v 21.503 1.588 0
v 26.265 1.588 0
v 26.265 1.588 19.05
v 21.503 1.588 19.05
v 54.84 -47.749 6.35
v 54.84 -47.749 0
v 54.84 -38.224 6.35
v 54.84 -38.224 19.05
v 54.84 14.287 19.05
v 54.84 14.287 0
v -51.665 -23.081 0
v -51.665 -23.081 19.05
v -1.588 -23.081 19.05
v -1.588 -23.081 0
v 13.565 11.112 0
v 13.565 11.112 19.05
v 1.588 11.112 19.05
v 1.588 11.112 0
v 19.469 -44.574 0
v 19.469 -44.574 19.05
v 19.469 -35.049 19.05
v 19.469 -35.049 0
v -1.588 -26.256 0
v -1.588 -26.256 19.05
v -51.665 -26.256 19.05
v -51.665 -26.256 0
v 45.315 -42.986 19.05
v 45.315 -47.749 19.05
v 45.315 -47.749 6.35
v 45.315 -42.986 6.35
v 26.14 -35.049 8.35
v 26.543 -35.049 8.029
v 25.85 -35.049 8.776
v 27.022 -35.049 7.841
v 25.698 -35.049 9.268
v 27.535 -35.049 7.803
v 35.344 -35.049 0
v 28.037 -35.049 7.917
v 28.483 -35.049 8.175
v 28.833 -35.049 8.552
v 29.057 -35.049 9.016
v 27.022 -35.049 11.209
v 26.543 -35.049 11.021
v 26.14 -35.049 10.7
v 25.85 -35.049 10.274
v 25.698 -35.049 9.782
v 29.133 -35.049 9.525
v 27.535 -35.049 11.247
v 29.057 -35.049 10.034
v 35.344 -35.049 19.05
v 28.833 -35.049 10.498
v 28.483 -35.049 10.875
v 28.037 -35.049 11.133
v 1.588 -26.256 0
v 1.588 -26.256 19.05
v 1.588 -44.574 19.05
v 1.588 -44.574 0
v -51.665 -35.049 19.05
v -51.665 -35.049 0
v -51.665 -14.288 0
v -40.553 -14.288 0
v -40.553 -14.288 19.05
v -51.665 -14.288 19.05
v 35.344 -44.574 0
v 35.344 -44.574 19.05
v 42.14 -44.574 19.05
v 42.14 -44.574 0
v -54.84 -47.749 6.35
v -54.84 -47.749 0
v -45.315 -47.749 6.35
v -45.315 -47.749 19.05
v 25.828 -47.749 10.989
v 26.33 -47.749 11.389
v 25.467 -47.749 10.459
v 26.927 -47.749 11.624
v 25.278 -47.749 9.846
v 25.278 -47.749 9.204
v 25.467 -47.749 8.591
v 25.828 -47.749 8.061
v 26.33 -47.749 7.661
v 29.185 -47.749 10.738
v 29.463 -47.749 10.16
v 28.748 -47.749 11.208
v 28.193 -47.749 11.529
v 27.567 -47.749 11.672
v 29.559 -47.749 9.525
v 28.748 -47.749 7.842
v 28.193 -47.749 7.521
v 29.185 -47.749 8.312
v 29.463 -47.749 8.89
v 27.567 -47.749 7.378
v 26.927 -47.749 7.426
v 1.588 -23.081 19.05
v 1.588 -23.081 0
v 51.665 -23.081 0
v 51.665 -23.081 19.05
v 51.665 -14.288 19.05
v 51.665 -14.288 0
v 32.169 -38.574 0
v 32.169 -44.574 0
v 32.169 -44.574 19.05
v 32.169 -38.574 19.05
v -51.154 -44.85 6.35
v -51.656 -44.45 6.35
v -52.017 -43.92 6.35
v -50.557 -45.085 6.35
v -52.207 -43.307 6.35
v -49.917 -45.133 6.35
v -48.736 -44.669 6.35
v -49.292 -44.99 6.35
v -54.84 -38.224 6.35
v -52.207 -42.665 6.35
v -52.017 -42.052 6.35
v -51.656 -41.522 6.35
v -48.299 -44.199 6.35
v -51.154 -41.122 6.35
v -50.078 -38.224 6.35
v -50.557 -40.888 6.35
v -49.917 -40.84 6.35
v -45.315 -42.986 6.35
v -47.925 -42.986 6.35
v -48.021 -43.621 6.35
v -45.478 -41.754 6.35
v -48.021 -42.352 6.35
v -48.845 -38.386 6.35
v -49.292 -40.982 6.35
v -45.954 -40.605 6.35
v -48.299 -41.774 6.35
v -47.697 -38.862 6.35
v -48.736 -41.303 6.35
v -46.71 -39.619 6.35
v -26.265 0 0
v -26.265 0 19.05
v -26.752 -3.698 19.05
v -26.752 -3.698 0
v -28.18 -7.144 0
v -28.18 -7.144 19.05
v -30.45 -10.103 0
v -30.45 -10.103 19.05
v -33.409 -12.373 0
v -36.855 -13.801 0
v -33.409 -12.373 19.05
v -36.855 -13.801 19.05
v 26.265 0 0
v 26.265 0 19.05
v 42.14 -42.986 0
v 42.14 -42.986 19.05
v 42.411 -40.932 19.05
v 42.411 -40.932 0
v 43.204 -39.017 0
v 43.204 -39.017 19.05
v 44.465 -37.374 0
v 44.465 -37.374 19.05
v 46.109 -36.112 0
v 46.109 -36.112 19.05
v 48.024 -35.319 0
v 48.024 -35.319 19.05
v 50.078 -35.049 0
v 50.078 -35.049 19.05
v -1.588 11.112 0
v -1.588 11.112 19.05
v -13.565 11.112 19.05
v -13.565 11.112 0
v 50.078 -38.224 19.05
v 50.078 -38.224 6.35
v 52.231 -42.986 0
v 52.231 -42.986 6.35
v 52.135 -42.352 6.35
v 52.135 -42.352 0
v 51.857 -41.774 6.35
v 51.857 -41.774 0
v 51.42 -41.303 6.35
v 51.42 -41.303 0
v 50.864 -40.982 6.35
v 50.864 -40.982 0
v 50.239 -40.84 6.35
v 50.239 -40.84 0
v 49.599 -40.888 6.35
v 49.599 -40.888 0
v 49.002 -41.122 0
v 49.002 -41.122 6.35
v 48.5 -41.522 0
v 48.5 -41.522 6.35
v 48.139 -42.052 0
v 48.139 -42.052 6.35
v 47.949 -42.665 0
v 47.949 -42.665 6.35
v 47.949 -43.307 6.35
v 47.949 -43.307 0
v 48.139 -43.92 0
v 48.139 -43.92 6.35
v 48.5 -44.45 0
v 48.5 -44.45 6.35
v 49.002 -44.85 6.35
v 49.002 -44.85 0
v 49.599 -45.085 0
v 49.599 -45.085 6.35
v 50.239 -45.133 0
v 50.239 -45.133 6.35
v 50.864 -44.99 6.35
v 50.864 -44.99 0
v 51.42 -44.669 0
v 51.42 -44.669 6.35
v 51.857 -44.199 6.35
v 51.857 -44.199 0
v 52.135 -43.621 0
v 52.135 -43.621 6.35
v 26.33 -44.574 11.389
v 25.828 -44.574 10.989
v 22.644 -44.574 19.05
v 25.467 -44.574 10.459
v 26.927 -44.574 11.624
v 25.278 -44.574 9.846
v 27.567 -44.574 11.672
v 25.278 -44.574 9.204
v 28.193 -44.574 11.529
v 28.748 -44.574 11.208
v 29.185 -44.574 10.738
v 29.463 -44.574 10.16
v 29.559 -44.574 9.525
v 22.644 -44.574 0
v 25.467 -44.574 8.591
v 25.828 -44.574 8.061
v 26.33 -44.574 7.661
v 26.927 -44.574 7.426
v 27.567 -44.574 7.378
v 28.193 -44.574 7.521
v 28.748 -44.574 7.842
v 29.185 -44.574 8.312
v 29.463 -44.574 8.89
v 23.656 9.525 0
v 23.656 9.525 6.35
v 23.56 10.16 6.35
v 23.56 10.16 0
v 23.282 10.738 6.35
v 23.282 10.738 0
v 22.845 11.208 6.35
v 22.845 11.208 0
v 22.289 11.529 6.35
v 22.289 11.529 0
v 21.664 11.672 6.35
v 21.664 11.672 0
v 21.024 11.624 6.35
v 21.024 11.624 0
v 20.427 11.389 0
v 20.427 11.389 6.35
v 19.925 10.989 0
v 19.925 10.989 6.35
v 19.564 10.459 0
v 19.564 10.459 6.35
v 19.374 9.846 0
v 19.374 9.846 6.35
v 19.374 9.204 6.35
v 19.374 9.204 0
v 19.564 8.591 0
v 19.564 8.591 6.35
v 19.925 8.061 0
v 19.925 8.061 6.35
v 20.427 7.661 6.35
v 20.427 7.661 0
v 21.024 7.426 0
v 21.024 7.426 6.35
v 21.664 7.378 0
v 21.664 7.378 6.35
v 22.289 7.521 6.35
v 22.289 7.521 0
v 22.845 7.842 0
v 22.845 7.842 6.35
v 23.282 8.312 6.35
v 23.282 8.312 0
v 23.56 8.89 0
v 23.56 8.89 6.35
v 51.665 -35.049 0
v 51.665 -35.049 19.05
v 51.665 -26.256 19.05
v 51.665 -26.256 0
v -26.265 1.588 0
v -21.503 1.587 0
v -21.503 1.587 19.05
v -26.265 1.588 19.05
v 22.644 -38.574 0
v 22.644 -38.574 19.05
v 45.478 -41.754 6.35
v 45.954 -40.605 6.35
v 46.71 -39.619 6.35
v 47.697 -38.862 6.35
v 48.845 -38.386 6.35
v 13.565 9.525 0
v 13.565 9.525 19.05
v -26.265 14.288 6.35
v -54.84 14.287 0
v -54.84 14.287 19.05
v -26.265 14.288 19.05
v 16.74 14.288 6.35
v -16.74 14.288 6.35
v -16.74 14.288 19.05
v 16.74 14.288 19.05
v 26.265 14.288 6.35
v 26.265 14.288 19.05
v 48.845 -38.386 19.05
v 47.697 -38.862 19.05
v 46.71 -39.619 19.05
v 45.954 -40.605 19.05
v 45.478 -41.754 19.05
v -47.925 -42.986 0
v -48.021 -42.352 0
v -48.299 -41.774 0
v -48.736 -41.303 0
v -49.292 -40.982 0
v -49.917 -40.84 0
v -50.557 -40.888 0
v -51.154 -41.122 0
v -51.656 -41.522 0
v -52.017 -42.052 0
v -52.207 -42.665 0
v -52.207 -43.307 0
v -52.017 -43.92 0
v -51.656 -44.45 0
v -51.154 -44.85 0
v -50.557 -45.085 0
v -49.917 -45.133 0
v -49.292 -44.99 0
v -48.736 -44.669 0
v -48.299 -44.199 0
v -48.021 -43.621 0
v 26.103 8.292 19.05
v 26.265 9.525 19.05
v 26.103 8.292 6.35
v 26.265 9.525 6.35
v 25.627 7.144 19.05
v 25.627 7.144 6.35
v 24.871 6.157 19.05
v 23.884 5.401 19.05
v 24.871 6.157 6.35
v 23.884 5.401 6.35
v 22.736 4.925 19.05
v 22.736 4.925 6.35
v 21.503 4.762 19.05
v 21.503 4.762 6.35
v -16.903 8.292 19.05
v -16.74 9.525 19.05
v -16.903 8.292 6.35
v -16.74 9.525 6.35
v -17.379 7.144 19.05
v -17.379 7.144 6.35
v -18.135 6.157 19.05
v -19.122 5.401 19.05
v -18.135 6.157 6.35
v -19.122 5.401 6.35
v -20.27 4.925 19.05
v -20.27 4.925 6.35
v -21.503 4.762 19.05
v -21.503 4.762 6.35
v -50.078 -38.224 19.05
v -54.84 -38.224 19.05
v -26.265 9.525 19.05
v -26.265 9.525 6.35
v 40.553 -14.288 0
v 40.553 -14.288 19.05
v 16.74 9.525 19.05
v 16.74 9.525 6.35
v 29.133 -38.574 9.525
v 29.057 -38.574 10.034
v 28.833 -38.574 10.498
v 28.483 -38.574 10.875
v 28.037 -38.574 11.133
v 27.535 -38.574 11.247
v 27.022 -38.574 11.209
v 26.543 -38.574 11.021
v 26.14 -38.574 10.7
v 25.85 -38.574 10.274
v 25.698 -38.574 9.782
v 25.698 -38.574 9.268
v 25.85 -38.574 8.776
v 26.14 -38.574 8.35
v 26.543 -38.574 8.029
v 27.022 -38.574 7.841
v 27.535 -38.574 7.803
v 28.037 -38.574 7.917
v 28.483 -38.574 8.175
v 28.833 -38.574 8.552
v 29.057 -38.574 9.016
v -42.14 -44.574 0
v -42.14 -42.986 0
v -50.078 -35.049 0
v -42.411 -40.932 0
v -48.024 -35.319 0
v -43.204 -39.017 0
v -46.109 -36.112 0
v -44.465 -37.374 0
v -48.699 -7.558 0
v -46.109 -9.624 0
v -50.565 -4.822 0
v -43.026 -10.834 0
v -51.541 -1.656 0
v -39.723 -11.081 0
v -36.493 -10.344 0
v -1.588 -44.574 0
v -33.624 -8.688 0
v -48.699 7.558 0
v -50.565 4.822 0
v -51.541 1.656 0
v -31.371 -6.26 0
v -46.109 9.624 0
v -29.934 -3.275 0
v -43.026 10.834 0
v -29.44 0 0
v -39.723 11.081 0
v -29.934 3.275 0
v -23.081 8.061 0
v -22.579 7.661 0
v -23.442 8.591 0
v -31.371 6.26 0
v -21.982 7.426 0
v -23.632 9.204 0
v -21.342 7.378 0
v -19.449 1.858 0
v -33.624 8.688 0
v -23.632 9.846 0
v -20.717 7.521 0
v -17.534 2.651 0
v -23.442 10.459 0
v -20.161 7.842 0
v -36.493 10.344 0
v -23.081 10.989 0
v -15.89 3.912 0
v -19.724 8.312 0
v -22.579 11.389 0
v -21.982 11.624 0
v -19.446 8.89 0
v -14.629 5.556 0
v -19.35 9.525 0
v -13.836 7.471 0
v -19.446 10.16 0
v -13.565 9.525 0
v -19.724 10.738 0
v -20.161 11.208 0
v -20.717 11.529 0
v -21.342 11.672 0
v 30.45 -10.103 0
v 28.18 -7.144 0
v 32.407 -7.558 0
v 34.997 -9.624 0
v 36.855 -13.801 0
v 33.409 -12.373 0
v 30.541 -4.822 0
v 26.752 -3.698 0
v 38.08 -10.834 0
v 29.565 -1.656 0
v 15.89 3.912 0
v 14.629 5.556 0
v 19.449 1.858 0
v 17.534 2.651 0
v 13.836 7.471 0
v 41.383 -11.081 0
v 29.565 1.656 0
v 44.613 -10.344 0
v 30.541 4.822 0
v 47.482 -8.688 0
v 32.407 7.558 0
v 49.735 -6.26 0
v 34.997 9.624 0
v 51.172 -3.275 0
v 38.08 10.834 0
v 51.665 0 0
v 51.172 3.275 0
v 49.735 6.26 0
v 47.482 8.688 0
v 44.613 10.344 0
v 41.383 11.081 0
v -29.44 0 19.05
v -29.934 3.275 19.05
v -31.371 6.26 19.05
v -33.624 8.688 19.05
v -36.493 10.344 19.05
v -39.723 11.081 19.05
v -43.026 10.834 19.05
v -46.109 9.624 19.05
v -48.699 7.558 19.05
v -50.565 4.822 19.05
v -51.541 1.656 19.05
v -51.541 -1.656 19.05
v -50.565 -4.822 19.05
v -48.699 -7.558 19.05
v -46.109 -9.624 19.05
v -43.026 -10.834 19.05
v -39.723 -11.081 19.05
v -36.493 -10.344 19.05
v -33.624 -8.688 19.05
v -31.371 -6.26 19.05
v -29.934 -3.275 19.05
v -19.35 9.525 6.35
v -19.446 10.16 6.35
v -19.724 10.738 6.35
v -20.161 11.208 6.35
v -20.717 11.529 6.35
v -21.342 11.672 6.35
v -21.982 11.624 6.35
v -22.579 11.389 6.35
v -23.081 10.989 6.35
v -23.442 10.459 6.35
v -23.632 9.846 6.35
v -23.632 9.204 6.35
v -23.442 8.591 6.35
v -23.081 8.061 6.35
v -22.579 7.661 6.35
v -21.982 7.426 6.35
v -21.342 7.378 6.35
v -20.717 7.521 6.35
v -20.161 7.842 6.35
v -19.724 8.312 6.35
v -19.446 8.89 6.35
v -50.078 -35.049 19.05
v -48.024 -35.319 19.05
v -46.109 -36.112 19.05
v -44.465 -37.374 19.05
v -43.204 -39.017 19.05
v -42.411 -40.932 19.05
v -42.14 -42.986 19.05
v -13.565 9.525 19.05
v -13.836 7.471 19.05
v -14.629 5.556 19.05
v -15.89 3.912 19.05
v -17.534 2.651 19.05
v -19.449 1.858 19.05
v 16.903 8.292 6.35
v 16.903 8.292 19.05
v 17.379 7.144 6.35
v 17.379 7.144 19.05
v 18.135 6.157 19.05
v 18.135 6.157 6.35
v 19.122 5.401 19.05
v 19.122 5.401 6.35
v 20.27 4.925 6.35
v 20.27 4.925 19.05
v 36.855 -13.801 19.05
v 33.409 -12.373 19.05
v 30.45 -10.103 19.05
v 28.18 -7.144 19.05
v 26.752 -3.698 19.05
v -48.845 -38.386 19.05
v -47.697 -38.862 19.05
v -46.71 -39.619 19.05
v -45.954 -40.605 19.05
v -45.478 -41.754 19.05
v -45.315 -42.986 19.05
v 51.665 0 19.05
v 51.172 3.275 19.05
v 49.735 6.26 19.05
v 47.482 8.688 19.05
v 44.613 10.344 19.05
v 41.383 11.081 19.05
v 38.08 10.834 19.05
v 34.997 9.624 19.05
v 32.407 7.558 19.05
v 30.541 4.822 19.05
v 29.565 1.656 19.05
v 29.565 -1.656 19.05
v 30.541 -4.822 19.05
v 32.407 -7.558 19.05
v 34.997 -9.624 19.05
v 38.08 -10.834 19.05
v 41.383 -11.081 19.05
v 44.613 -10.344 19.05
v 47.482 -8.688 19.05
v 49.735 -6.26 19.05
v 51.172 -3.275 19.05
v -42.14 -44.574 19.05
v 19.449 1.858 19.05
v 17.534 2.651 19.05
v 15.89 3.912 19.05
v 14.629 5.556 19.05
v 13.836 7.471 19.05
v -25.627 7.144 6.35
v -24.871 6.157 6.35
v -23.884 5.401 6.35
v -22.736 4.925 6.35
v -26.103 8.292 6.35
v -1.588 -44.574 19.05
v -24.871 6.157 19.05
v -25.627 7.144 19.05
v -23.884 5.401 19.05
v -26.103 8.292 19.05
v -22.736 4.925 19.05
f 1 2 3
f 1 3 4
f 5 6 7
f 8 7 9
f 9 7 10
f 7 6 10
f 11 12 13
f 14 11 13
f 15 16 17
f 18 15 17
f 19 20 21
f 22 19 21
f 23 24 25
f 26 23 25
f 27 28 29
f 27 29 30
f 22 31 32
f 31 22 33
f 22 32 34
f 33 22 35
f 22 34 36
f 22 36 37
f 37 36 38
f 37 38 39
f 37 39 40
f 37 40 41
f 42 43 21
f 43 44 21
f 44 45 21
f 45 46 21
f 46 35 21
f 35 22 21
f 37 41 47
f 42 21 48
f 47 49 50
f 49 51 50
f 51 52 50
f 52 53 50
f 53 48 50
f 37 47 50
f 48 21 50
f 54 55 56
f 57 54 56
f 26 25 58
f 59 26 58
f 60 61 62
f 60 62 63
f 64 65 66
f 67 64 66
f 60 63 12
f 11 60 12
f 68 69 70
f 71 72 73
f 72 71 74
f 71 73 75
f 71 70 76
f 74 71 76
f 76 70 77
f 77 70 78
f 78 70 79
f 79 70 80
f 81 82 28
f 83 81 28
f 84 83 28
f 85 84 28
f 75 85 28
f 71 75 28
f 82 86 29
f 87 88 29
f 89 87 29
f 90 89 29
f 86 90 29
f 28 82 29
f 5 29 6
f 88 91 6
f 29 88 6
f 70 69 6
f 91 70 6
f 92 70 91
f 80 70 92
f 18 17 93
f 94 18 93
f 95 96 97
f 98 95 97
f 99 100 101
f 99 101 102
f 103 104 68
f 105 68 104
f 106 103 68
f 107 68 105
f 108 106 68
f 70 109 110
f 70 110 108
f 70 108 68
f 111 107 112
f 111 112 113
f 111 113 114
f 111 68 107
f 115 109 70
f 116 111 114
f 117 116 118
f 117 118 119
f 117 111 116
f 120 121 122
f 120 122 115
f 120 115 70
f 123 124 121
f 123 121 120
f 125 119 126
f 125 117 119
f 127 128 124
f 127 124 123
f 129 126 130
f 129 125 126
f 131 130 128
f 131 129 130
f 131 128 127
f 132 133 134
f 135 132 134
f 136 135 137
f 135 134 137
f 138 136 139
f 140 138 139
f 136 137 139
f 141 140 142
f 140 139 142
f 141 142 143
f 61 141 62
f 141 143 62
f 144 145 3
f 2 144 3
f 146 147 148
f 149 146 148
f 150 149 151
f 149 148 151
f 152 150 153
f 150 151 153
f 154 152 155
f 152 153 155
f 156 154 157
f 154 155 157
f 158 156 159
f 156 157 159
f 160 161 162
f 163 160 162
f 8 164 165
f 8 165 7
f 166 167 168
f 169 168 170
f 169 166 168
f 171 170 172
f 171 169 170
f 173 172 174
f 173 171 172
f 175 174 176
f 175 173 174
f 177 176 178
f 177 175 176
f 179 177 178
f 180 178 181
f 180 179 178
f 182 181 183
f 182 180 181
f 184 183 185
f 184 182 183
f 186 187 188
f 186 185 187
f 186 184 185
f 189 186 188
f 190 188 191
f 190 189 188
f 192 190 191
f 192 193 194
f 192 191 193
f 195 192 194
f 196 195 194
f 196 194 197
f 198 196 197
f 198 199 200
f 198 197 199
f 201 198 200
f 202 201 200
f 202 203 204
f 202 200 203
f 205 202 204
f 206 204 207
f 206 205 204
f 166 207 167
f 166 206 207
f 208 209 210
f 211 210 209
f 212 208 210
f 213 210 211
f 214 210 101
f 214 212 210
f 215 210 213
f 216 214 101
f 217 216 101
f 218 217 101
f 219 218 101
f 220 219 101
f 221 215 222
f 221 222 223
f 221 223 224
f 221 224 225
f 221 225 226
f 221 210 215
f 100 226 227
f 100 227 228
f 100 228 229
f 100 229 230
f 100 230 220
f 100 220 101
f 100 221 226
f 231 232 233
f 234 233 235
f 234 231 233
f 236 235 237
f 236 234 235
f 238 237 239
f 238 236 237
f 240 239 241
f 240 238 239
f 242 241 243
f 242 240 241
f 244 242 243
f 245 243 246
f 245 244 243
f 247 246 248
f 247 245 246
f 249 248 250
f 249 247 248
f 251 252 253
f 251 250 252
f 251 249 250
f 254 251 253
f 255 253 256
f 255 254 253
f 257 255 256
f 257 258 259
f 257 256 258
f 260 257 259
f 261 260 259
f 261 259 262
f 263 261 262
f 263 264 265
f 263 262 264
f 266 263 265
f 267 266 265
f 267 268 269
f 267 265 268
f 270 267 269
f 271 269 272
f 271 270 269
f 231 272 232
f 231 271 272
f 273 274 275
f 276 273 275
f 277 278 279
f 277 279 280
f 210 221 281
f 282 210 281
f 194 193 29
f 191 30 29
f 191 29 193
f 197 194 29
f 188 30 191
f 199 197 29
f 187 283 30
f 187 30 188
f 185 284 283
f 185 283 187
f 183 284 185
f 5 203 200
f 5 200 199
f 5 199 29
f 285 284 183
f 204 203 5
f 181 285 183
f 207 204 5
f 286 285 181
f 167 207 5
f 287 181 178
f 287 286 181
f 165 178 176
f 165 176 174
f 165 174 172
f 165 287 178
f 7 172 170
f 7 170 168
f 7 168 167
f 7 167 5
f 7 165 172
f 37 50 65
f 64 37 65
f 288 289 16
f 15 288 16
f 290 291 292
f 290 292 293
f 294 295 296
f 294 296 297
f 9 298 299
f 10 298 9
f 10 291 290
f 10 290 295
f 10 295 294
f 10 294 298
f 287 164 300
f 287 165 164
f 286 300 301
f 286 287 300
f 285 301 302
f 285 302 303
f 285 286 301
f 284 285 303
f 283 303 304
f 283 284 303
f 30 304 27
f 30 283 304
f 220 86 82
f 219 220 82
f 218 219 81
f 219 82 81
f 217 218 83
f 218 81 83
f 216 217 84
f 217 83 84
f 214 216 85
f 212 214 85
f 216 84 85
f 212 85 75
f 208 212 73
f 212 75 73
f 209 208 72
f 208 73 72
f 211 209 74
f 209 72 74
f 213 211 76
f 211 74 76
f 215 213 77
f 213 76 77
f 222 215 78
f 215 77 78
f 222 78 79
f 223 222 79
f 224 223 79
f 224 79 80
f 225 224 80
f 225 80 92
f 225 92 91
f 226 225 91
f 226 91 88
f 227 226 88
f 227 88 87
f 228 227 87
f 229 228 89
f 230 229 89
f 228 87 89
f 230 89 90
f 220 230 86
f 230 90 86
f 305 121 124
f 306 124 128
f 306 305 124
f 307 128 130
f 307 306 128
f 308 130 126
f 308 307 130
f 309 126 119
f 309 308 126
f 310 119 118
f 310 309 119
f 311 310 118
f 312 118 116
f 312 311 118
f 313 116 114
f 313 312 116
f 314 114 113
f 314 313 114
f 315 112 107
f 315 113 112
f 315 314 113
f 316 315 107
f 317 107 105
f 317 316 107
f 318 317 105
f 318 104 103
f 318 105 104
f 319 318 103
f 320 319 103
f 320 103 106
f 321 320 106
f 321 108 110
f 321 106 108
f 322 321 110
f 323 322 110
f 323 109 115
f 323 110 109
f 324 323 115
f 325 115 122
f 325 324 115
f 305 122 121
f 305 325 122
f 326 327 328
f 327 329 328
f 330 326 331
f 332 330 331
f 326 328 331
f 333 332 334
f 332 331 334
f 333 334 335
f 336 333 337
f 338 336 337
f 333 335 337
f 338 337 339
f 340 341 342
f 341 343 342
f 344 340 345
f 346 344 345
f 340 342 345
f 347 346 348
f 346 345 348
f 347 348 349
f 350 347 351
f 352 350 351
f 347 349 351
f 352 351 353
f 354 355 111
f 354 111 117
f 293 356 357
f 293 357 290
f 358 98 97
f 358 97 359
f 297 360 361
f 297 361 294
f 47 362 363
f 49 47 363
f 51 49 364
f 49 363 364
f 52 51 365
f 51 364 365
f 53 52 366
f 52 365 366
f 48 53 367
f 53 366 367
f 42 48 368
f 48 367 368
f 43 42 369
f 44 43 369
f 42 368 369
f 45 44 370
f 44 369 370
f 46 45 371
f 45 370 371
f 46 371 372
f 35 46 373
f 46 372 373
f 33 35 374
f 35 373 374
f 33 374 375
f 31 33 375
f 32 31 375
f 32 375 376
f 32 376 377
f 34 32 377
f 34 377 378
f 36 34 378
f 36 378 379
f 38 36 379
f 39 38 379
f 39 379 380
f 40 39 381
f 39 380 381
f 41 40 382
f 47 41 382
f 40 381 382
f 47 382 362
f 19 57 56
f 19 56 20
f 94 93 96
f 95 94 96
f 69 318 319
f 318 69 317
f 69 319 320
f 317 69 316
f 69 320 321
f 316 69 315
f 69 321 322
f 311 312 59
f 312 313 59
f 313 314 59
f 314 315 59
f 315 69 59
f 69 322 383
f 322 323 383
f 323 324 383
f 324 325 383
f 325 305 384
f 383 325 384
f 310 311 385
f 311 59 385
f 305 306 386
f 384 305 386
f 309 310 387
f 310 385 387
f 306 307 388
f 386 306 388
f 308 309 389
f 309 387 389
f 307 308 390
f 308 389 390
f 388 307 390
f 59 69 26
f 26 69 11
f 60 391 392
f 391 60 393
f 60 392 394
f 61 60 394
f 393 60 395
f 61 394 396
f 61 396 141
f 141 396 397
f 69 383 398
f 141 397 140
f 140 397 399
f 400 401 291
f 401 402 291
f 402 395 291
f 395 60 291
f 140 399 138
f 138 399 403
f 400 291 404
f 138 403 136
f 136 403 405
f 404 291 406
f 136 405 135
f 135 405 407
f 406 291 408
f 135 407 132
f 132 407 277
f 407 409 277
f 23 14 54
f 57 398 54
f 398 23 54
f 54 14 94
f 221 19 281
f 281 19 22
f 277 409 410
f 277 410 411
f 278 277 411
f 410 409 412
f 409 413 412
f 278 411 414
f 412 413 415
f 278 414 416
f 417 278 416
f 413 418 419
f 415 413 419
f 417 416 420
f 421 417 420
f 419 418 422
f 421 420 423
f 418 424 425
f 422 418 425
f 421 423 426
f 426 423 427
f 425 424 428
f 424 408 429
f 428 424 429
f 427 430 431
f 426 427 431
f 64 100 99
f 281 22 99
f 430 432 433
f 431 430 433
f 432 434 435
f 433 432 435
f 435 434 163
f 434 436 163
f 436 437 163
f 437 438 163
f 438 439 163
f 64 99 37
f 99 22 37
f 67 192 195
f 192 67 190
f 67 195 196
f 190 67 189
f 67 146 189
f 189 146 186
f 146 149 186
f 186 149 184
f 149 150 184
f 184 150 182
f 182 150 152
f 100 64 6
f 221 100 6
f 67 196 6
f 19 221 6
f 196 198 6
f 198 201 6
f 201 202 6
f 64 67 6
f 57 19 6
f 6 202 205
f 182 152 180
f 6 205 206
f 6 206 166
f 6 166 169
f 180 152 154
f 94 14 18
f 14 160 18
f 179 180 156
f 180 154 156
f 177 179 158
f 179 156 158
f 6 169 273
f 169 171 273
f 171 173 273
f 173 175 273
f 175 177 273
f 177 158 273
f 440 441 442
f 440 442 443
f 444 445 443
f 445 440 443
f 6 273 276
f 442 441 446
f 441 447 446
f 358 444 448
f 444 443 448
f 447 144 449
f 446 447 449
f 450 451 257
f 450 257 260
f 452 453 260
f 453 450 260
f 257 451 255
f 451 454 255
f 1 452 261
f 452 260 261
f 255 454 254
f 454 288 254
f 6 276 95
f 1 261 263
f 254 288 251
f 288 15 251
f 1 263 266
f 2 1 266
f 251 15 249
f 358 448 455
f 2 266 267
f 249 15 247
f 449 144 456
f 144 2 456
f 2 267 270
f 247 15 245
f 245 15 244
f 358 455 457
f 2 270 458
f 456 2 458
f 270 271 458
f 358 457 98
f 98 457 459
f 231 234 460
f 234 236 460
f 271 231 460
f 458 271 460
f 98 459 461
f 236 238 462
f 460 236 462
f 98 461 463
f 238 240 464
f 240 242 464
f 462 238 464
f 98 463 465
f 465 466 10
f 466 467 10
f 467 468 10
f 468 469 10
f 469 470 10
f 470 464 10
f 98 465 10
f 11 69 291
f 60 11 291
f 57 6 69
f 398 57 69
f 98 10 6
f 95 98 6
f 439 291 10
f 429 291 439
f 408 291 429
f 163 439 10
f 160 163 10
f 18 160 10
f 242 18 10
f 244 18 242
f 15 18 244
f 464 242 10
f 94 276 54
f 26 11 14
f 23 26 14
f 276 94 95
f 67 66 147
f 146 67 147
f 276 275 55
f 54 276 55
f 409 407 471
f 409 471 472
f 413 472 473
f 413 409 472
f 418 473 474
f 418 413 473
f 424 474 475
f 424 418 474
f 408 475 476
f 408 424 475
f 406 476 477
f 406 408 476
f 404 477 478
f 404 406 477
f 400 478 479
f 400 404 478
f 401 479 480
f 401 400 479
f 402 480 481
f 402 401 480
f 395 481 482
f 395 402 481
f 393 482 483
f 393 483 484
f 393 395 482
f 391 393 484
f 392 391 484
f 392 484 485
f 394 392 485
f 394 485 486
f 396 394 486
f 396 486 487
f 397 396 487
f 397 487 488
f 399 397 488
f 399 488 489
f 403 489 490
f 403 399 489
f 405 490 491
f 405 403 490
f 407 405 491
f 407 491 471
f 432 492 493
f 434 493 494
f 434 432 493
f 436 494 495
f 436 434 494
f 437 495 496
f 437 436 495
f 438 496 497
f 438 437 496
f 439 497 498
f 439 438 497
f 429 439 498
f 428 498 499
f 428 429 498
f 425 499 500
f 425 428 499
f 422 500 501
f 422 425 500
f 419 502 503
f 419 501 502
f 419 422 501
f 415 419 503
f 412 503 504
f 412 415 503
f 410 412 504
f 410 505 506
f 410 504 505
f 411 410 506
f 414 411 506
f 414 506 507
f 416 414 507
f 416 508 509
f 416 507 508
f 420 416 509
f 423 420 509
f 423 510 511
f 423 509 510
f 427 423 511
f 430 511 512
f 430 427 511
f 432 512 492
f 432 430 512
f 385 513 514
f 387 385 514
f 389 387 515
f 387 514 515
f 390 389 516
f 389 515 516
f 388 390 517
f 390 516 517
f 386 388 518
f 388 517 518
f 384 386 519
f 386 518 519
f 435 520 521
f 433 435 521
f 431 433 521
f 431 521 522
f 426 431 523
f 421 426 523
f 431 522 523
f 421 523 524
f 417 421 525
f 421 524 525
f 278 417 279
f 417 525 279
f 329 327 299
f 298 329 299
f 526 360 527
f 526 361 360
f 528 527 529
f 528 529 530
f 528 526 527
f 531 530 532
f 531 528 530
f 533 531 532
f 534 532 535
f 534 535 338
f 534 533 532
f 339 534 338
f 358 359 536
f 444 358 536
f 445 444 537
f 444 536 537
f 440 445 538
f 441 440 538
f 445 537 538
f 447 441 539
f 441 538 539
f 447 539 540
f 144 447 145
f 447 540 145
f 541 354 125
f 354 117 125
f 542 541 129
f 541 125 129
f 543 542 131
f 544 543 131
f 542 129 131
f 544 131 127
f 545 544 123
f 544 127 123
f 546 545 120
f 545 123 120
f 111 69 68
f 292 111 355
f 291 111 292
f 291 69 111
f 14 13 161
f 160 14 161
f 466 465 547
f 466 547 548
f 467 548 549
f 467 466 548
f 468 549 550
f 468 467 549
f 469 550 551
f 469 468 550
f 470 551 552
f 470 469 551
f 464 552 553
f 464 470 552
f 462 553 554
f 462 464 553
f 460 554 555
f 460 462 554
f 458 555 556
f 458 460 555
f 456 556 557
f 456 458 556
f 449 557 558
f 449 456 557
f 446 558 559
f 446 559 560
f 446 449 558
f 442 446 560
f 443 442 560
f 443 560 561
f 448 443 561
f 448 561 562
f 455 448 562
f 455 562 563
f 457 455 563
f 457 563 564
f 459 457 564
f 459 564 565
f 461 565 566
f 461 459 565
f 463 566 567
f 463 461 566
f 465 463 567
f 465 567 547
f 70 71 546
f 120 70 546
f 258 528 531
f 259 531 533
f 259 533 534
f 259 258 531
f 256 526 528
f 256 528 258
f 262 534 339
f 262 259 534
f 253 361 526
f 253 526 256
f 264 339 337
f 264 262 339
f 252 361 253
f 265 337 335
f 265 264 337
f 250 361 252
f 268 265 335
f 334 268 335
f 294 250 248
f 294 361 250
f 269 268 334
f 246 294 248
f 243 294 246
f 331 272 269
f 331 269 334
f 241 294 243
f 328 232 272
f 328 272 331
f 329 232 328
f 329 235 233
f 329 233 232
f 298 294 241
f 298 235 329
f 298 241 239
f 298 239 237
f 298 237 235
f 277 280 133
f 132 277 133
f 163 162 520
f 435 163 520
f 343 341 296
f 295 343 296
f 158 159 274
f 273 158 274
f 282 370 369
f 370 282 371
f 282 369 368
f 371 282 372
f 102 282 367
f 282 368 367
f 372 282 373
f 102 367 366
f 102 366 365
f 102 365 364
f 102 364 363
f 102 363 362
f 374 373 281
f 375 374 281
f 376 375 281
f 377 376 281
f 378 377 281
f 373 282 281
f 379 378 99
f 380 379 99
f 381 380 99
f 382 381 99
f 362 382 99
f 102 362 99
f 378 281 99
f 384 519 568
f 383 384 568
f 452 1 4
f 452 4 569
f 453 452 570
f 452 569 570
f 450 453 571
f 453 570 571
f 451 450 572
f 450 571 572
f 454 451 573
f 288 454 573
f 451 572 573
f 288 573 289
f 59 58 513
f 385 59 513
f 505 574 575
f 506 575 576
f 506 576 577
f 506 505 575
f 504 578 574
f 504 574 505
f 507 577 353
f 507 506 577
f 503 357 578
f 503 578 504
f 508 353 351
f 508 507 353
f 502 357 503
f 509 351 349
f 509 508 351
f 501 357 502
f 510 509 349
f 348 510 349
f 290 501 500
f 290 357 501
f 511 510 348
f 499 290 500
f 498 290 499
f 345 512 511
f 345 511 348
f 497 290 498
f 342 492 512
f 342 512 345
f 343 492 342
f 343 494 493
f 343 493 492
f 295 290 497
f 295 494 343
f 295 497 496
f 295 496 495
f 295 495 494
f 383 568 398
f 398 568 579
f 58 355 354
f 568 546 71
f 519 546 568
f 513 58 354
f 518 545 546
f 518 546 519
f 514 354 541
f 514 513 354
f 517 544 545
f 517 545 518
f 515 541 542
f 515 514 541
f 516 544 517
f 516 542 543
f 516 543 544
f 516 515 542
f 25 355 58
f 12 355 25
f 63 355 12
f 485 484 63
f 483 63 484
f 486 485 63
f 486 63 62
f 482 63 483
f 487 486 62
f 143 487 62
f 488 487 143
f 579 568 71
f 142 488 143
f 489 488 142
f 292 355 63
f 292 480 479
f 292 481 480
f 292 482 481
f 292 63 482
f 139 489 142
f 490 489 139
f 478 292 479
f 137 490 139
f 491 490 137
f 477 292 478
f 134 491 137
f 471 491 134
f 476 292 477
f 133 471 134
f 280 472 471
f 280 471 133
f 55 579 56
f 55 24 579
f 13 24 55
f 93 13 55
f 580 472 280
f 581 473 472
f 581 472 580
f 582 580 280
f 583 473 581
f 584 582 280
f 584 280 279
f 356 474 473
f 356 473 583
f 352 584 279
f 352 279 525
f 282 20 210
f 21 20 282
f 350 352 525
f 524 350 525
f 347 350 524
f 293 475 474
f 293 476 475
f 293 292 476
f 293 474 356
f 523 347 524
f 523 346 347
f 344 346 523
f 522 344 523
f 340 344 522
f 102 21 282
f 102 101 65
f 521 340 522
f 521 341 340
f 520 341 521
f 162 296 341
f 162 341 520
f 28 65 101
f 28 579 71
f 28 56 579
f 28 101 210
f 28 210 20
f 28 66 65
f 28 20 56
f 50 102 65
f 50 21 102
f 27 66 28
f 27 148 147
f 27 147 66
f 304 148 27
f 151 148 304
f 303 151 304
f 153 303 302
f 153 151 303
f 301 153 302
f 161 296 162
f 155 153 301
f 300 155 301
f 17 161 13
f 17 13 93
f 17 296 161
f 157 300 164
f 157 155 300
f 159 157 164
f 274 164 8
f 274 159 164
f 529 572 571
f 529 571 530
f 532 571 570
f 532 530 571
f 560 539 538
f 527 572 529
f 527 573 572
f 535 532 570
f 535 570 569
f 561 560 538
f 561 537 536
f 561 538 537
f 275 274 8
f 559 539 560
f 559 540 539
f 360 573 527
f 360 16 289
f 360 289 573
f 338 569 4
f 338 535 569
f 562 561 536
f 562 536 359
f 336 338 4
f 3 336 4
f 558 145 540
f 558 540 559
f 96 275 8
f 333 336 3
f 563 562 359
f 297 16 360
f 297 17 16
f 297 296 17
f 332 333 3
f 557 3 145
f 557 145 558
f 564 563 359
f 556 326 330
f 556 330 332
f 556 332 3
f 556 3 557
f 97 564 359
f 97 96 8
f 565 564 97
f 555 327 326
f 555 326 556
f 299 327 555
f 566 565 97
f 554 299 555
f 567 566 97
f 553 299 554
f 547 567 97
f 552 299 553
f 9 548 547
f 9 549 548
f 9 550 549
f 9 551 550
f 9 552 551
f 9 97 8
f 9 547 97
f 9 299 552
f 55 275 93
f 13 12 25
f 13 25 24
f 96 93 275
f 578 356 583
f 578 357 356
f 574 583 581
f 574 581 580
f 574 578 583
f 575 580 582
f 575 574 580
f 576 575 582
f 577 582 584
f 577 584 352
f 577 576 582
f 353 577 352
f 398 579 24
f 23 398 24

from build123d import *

# Parameters (mm, degrees)
F0_W      = 109.6809846
F0_H      = 62.036204
F0_R      = 2.15265
F0_W_2    = 9.525
F0_H_2    = 6
F0_R_2    = 11.1125
F1_DEPTH  = 19.05
F2_W      = 9.525
F2_H      = 9.525
F3_DEPTH  = 12.7
F4_R      = 4.76249
F6_DEPTH  = 19.05
F7_R      = 2.15265
F8_DEPTH  = 3.175
F9_R      = 1.7272
F10_DEPTH = 3.525


# Not quite as in the source:
# - a fillet or chamfer is up to 0.001 mm smaller than in the source, because OpenCascade refuses the exact size


with BuildPart() as f1:
    # F0 (on Top) → F1 (new body)
    with BuildSketch(Plane.XY):
        with Locations((0, -16.730602)):
            Rectangle(F0_W, F0_H)
        with Locations((-50.0779923, -42.986204)):
            Circle(F0_R, mode=Mode.SUBTRACT)
        with Locations((27.406219, -41.573704)):
            Rectangle(F0_W_2, F0_H_2, mode=Mode.SUBTRACT)
        with Locations((50.0779923, -42.986204)):
            Circle(F0_R, mode=Mode.SUBTRACT)
        with Locations((-40.5529923, 0)):
            Circle(F0_R_2, mode=Mode.SUBTRACT)
        with Locations((-21.5029923, 9.525)):
            Circle(F0_R, mode=Mode.SUBTRACT)
        with Locations((21.5029923, 9.525)):
            Circle(F0_R, mode=Mode.SUBTRACT)
        with Locations((40.5529923, 0)):
            Circle(F0_R_2, mode=Mode.SUBTRACT)
    extrude(amount=F1_DEPTH)

    # F2 (on face) → F3 (cut)
    with BuildSketch(Plane.XY.offset(19.05)):
        with Locations((-21.5029923, 9.525)):
            Rectangle(F2_W, F2_H)
        with Locations((21.5029923, 9.525)):
            Rectangle(F2_W, F2_H)
        with Locations((50.0779923, -42.986204)):
            Rectangle(F2_W, F2_H)
        with Locations((-50.0779923, -42.986204)):
            Rectangle(F2_W, F2_H)
    extrude(amount=-F3_DEPTH, mode=Mode.SUBTRACT)

    # F4 (radius 4.7625 in the source; OpenCascade refuses exactly that, so slightly less here)
    f4_edges = [f1.edges().sort_by_distance(p)[0] for p in [
        (-45.315492, -38.223704, 12.7),
        (45.315492, -38.223704, 12.7),
        (16.740492, 4.7625, 12.7),
        (26.265492, 4.7625, 12.7),
        (-16.740492, 4.7625, 12.7),
        (-26.265492, 4.7625, 12.7),
    ]]
    fillet(f4_edges, radius=F4_R)

    # F5 (on face) → F6 (cut, through all)
    with BuildSketch(Plane.XY.offset(19.05)):
        with BuildLine():
            Line((-51.6654923, -23.080602), (-1.5875, -23.080602))
            Line((-1.5875, -23.080602), (-1.5875, 11.1125))
            Line((-1.5875, 11.1125), (-13.5654923, 11.1125))
            Line((-13.5654923, 11.1125), (-13.5654923, 9.525))
            ThreePointArc((-13.5654923, 9.525), (-15.8903322243, 3.9123399243), (-21.5029923, 1.5875))
            Line((-21.5029923, 1.5875), (-26.2654923, 1.5875))
            Line((-26.2654923, 1.5875), (-26.2654923, 0))
            ThreePointArc((-26.2654923, 0), (-30.4502041638, -10.1027881362), (-40.5529923, -14.2875))
            Line((-40.5529923, -14.2875), (-51.6654923, -14.2875))
            Line((-51.6654923, -14.2875), (-51.6654923, -23.080602))
        make_face()
        with BuildLine():
            Line((-1.5875, -44.573704), (-1.5875, -26.255602))
            Line((-1.5875, -26.255602), (-51.6654923, -26.255602))
            Line((-51.6654923, -26.255602), (-51.6654923, -35.048704))
            Line((-51.6654923, -35.048704), (-50.0779923, -35.048704))
            ThreePointArc((-50.0779923, -35.048704), (-44.4653322243, -37.3735439243), (-42.1404923, -42.986204))
            Line((-42.1404923, -42.986204), (-42.1404923, -44.573704))
            Line((-42.1404923, -44.573704), (-1.5875, -44.573704))
        make_face()
        with BuildLine():
            Line((1.5875, -23.080602), (51.6654923, -23.080602))
            Line((51.6654923, -23.080602), (51.6654923, -14.2875))
            Line((51.6654923, -14.2875), (40.5529923, -14.2875))
            ThreePointArc((40.5529923, -14.2875), (30.4502041638, -10.1027881362), (26.2654923, 0))
            Line((26.2654923, 0), (26.2654923, 1.5875))
            Line((26.2654923, 1.5875), (21.5029923, 1.5875))
            ThreePointArc((21.5029923, 1.5875), (15.8903322243, 3.9123399243), (13.5654923, 9.525))
            Line((13.5654923, 9.525), (13.5654923, 11.1125))
            Line((13.5654923, 11.1125), (1.5875, 11.1125))
            Line((1.5875, 11.1125), (1.5875, -23.080602))
        make_face()
        with BuildLine():
            Line((51.6654923, -26.255602), (1.5875, -26.255602))
            Line((1.5875, -26.255602), (1.5875, -44.573704))
            Line((1.5875, -44.573704), (19.468719, -44.573704))
            Line((19.468719, -44.573704), (19.468719, -35.048704))
            Line((19.468719, -35.048704), (35.343719, -35.048704))
            Line((35.343719, -35.048704), (35.343719, -44.573704))
            Line((35.343719, -44.573704), (42.1404923, -44.573704))
            Line((42.1404923, -44.573704), (42.1404923, -42.986204))
            ThreePointArc((42.1404923, -42.986204), (44.4653322243, -37.3735439243), (50.0779923, -35.048704))
            Line((50.0779923, -35.048704), (51.6654923, -35.048704))
            Line((51.6654923, -35.048704), (51.6654923, -26.255602))
        make_face()
    extrude(amount=-F6_DEPTH, mode=Mode.SUBTRACT)

    # F7 (on face) → F8 (cut, through all)
    with BuildSketch(Plane.XZ.offset(47.748704)):
        with Locations((27.406219, 9.525)):
            Circle(F7_R)
    extrude(amount=-F8_DEPTH, mode=Mode.SUBTRACT)

    # F9 (on face) → F10 (cut, through all)
    with BuildSketch(Plane.XZ.offset(38.573704)):
        with Locations((27.406219, 9.525)):
            Circle(F9_R)
    extrude(amount=-F10_DEPTH, mode=Mode.SUBTRACT)


solid = f1.part
